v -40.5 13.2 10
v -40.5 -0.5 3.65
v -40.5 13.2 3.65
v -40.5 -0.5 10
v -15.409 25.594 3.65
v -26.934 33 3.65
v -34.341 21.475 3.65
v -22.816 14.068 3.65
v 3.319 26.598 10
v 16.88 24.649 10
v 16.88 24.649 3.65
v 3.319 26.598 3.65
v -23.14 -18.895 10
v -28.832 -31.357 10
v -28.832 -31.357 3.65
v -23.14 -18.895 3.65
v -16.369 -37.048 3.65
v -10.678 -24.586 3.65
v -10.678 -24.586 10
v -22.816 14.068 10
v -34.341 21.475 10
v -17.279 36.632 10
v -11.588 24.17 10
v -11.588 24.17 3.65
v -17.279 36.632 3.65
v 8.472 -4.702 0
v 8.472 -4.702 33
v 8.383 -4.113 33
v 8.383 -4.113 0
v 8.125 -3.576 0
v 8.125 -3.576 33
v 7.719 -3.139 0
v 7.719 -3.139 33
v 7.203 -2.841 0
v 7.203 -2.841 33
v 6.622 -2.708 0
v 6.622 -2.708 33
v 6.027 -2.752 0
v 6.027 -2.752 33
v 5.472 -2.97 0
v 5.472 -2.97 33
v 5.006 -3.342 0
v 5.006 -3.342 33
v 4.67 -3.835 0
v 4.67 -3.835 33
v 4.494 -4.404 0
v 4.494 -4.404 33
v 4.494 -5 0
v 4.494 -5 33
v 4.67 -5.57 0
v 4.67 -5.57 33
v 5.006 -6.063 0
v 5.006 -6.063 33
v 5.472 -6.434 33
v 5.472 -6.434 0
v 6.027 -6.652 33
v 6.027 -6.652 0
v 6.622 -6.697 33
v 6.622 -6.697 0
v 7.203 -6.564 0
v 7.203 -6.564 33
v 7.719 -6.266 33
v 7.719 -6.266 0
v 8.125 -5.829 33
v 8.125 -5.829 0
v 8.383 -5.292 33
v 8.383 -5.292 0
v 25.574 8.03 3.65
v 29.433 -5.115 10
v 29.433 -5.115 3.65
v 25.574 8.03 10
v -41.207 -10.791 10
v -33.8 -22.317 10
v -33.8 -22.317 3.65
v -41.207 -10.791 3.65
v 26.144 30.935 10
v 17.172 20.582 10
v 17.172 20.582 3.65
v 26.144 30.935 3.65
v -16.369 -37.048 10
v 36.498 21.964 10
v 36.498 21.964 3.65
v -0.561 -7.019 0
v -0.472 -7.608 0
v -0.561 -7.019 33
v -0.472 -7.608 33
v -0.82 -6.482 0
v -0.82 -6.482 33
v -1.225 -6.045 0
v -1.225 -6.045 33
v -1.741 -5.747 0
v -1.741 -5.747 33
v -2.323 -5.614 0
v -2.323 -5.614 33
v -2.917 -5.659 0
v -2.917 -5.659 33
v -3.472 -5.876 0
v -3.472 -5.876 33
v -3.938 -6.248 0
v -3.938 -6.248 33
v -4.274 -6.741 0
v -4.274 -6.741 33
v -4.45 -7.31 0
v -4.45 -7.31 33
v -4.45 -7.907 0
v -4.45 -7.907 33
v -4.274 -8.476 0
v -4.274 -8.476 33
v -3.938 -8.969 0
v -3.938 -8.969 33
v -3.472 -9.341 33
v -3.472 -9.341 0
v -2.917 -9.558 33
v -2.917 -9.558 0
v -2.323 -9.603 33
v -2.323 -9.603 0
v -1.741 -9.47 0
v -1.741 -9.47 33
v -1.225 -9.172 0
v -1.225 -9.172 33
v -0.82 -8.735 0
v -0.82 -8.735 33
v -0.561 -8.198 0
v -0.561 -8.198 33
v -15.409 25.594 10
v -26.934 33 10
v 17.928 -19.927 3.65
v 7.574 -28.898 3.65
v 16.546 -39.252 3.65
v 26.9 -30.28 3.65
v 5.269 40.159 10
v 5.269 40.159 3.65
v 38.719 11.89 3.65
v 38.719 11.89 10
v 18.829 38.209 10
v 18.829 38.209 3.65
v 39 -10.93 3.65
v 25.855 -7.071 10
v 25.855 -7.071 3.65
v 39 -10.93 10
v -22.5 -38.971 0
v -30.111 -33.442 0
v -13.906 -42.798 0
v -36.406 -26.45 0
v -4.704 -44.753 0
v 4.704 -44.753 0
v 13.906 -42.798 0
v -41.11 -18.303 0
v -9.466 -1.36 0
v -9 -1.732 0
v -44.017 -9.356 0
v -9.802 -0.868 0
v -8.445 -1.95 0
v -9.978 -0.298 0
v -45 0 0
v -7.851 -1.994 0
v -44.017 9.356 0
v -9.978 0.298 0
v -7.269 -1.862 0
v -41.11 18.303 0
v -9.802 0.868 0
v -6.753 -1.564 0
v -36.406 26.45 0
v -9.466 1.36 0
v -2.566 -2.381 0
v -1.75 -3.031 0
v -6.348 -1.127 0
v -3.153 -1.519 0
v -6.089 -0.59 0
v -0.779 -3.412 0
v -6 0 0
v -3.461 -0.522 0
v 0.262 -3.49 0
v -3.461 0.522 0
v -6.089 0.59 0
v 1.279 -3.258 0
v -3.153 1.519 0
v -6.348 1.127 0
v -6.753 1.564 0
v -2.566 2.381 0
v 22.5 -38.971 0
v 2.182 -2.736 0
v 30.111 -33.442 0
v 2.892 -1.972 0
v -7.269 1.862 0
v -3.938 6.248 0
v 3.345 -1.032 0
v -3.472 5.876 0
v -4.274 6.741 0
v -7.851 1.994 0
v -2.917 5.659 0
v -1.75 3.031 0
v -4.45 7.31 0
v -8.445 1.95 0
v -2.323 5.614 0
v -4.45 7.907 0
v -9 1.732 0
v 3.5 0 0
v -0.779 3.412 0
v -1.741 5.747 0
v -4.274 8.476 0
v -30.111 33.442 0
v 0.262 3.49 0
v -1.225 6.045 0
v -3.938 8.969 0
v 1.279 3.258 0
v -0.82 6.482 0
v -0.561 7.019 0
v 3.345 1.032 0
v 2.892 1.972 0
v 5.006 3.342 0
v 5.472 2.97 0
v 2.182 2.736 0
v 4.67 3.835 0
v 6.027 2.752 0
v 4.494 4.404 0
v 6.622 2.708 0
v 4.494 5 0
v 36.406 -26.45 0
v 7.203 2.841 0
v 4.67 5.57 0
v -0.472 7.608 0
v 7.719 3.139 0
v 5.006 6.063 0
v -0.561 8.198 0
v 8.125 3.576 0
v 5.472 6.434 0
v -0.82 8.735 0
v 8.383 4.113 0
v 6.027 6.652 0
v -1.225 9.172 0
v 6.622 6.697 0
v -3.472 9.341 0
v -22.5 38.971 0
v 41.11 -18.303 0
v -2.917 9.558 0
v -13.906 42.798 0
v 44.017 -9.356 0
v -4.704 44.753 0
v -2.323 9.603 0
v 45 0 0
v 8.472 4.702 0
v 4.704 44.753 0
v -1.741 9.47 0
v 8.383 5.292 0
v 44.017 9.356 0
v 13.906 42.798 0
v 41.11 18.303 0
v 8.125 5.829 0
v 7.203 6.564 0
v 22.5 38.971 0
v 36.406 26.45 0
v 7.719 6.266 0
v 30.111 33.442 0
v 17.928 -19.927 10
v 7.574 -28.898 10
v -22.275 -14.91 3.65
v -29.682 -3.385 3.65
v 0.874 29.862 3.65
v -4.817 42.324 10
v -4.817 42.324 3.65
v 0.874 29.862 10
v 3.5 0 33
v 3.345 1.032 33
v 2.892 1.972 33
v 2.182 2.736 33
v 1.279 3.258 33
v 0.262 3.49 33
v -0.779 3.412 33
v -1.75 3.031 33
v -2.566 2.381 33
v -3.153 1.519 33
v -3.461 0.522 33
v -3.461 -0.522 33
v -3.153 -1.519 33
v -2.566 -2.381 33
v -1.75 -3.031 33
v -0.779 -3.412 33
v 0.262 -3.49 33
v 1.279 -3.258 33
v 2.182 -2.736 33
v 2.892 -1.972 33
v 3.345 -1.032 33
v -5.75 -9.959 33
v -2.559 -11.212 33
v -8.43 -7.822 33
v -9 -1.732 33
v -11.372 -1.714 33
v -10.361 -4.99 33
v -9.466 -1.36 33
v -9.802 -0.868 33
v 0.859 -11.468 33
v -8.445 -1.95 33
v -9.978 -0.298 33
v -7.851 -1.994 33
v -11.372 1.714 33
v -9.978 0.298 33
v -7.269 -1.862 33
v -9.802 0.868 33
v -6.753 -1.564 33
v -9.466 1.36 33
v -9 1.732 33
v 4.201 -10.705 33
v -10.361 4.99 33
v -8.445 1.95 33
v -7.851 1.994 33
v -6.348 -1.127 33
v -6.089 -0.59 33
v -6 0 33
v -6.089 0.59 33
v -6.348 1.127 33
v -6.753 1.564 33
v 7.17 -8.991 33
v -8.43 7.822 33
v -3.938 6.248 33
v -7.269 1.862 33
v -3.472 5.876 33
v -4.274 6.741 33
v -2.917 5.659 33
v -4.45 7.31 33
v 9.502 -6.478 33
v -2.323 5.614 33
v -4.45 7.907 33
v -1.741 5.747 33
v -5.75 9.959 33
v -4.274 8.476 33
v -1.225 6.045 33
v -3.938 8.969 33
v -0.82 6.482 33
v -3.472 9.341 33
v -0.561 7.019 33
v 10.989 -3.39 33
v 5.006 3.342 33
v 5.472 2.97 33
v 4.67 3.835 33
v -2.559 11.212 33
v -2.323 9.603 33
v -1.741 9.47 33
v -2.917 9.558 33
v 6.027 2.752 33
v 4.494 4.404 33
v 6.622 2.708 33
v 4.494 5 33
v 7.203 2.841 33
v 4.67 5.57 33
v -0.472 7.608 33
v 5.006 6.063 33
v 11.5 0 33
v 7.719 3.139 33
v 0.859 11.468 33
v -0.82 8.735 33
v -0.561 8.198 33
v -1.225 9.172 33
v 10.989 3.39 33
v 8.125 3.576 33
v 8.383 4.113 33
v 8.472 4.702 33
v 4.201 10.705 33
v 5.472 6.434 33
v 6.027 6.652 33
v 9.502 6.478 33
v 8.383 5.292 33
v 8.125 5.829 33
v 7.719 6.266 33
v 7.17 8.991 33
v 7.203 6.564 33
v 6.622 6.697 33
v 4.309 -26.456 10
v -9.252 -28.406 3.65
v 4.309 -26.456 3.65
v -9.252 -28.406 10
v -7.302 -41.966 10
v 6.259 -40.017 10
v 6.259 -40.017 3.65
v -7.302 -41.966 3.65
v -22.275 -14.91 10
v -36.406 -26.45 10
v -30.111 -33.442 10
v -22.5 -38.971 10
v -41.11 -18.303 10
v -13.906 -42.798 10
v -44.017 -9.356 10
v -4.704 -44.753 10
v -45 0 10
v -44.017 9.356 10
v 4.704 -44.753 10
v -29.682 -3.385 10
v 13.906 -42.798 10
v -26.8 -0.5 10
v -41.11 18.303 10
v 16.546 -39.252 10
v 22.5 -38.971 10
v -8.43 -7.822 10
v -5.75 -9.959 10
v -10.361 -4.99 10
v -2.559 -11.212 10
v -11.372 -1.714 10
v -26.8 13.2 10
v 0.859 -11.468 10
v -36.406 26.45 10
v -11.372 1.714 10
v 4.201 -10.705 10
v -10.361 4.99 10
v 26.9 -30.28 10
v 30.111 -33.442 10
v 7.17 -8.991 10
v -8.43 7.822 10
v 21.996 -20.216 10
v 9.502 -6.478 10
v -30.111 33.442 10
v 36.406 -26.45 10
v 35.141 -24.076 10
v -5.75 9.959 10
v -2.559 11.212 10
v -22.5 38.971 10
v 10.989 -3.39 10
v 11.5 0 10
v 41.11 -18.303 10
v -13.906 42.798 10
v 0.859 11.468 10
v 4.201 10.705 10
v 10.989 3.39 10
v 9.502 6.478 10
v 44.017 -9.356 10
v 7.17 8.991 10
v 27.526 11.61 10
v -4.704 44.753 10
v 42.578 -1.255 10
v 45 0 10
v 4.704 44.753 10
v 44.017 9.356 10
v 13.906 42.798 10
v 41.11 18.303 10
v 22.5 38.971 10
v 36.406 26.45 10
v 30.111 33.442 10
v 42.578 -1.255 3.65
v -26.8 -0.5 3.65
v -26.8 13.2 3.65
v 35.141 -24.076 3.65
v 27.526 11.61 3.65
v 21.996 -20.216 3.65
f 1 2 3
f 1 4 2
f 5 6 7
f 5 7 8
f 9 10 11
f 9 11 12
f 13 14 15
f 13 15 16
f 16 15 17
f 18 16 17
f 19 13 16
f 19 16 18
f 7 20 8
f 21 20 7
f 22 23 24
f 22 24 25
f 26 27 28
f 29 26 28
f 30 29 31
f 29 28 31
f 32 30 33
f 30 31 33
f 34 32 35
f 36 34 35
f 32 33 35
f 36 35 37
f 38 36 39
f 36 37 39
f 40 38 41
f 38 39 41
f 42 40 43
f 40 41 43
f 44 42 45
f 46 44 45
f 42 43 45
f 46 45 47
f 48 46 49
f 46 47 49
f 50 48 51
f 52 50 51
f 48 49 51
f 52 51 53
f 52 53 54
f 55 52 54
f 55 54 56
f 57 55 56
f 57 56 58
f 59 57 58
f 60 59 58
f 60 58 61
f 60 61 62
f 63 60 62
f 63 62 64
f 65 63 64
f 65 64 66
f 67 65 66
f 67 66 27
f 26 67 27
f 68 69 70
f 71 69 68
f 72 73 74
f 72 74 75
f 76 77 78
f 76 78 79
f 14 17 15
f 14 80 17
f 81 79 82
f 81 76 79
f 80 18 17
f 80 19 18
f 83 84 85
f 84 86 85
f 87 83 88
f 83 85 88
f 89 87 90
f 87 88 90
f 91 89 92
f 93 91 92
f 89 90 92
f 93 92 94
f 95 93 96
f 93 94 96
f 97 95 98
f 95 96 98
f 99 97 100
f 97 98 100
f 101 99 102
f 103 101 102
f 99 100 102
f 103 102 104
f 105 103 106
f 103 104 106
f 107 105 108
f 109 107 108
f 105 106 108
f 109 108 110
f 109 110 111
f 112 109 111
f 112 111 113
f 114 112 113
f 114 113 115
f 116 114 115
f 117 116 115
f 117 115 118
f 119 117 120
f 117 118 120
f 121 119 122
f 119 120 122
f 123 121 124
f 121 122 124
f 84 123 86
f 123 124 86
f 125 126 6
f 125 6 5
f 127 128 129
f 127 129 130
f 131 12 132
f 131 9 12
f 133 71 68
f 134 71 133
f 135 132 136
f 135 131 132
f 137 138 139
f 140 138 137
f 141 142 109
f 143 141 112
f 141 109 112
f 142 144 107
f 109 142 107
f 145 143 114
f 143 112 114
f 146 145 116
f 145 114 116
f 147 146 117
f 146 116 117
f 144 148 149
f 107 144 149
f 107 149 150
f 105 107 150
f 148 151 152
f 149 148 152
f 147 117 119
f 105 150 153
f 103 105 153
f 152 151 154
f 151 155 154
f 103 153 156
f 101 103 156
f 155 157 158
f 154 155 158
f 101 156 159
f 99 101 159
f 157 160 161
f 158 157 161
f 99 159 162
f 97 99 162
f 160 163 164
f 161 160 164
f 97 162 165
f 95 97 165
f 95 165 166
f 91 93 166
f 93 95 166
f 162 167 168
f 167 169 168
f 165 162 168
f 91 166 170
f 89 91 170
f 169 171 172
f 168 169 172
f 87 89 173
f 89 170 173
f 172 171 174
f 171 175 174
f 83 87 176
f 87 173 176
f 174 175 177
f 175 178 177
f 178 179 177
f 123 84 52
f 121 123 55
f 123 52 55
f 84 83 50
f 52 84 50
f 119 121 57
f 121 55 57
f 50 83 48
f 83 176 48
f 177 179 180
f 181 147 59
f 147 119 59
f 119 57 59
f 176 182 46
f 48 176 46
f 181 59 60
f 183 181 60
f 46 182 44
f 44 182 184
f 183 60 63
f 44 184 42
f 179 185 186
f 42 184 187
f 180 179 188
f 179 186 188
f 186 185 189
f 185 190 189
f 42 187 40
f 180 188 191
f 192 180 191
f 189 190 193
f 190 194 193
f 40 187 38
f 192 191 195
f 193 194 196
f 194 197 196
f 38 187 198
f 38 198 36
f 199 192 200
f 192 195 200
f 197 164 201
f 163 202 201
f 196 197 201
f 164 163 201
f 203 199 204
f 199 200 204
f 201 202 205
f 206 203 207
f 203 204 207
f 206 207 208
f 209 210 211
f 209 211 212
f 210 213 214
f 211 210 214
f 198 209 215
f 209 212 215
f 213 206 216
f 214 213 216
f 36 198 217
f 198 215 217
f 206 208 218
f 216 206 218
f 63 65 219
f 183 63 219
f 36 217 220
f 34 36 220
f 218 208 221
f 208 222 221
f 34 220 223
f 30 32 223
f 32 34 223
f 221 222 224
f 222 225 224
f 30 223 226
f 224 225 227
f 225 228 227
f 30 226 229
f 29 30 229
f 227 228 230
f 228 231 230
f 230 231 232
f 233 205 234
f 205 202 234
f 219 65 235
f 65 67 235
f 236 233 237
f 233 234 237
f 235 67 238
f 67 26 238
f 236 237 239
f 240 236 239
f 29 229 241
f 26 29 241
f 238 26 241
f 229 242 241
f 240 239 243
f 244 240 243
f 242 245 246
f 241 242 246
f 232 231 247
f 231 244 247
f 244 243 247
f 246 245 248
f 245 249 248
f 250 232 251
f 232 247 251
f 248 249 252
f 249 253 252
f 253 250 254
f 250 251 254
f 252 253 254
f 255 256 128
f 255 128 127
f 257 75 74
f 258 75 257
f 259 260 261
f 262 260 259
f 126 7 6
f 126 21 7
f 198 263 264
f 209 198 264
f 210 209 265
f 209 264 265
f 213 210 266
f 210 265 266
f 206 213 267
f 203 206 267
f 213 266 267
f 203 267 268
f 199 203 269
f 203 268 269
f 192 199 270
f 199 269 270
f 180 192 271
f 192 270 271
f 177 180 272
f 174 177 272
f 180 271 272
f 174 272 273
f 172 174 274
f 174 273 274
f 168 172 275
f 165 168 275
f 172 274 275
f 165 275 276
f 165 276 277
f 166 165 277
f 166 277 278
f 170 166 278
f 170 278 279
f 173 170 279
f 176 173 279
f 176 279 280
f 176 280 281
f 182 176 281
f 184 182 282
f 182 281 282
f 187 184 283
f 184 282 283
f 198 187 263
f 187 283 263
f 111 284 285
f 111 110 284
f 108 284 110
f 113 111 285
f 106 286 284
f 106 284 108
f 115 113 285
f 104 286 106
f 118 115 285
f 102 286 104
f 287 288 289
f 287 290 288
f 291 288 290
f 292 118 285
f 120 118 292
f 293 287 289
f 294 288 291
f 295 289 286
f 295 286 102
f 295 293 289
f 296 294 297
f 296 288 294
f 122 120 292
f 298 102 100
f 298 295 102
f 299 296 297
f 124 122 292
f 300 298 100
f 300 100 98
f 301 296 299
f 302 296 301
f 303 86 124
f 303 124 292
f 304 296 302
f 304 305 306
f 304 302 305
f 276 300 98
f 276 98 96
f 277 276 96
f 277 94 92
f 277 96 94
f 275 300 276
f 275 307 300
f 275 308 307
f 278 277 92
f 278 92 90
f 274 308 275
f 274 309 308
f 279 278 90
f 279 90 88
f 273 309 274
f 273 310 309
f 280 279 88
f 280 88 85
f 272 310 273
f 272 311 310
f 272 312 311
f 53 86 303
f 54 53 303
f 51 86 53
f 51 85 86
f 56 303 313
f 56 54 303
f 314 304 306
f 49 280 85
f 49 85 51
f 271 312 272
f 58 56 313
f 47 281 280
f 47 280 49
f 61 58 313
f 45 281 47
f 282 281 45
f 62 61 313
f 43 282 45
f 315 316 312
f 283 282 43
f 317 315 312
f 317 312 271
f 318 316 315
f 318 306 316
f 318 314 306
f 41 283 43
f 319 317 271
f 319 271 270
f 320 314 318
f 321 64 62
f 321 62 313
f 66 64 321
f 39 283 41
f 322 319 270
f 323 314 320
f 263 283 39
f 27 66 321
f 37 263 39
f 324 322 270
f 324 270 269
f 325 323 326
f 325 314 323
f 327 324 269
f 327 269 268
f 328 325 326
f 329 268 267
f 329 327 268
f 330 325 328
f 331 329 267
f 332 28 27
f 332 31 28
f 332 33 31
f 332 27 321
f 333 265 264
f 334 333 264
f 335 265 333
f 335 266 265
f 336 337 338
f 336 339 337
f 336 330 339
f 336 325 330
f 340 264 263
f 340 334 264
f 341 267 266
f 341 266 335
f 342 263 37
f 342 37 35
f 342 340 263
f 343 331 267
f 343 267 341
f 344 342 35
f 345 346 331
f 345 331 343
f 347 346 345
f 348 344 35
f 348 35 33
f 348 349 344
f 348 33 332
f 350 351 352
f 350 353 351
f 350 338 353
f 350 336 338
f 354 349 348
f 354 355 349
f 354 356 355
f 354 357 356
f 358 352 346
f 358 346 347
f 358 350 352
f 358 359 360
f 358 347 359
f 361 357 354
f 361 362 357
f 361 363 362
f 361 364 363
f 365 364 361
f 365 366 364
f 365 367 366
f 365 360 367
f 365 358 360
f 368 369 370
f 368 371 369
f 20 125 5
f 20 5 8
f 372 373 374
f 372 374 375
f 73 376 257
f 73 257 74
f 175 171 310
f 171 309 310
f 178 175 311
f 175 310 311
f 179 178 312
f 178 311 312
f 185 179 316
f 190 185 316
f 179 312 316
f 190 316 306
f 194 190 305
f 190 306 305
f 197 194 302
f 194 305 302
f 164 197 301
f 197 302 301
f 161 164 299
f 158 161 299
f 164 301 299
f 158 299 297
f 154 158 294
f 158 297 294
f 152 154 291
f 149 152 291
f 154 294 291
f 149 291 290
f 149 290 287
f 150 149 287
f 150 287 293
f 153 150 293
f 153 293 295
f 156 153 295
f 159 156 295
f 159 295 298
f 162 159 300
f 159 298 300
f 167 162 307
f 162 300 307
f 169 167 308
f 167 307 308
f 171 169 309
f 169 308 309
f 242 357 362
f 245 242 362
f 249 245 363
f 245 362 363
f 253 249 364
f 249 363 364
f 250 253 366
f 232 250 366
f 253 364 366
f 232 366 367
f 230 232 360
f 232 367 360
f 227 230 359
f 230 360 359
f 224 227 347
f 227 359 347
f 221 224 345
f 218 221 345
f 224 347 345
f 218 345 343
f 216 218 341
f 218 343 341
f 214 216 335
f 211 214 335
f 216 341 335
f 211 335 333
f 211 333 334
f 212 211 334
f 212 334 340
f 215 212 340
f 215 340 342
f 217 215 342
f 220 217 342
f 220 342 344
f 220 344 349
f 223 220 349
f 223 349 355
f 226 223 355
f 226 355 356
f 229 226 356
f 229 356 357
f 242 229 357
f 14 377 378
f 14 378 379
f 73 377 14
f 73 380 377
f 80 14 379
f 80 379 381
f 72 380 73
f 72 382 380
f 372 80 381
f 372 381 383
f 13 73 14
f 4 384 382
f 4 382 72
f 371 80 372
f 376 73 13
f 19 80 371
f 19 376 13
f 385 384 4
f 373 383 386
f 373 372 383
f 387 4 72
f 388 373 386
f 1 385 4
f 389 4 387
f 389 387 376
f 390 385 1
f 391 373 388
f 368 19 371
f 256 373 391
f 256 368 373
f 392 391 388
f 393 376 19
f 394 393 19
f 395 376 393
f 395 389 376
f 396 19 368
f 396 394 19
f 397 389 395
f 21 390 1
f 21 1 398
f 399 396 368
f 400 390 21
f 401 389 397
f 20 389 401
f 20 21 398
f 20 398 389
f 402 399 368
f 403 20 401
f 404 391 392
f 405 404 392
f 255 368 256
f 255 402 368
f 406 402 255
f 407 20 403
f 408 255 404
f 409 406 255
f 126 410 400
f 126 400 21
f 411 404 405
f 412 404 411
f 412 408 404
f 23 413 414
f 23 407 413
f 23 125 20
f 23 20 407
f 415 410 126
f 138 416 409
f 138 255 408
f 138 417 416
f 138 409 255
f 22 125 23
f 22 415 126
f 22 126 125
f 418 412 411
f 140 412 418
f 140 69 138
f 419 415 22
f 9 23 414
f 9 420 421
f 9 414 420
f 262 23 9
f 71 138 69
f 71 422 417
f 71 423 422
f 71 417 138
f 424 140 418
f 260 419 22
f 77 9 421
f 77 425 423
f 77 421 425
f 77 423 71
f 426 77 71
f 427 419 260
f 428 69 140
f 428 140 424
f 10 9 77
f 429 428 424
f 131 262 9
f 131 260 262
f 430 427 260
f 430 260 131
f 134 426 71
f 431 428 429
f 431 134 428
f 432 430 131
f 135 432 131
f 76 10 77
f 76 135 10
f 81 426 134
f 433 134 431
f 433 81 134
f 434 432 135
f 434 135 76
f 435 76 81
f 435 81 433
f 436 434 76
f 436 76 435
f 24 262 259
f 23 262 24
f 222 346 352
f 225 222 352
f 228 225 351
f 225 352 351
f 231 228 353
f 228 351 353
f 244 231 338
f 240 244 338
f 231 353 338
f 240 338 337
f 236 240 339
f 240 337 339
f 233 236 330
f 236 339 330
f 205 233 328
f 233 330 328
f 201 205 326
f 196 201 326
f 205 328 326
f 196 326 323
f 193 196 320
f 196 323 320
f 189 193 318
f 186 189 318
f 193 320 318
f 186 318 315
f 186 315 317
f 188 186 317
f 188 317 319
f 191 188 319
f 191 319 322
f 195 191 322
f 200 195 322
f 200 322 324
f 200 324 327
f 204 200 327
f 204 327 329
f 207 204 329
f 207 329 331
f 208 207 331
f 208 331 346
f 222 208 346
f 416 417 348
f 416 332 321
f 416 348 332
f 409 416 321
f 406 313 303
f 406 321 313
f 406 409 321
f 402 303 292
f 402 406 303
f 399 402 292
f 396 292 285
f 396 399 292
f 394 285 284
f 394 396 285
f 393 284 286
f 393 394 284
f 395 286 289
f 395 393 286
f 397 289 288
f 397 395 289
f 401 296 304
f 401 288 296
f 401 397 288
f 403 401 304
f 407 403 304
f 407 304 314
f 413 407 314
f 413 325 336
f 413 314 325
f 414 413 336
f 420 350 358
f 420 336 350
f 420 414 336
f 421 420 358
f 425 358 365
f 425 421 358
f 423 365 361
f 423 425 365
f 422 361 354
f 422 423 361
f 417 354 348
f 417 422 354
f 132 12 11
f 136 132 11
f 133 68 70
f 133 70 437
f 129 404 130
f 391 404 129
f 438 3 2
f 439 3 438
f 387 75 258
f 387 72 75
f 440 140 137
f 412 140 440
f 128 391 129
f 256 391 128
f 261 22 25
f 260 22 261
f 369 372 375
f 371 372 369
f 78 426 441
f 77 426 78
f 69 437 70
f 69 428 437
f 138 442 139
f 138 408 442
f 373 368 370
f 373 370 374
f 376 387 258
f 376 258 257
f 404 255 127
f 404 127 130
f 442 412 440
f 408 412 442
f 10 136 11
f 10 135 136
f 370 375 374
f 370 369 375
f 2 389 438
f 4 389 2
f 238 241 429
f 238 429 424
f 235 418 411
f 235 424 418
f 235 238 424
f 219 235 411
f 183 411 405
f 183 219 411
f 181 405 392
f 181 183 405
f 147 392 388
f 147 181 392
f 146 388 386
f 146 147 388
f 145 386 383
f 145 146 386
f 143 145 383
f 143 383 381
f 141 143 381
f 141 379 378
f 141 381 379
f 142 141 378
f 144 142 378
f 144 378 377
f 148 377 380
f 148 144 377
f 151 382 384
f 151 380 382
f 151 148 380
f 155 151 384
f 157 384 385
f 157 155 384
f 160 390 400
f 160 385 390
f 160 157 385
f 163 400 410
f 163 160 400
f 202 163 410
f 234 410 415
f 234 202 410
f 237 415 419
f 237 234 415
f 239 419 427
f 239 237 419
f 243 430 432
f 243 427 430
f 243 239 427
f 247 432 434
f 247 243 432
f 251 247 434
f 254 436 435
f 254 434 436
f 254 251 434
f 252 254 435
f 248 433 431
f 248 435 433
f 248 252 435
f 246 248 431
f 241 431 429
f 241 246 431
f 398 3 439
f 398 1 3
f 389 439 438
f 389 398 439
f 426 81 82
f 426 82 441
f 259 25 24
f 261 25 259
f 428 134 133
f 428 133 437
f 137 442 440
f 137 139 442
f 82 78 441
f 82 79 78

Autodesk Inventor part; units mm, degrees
ref_plane "YZ Plane" through (0, 0, 0) normal (1, 0, 0) x (0, 1, 0)
ref_plane "XZ Plane" through (0, 0, 0) normal (0, 1, 0) x (-1, 0, 0)
ref_plane "XY Plane" through (0, 0, 0) normal (0, 0, 1) x (1, 0, 0)
sketch "Sketch2" plane through (0, 0, 0) normal (0, 0, 1) x (1, 0, 0)
  circle A0 centre (0, 0) radius 45
  dimension "d0" = 90
extrude "Extrusion1" add sketch "Sketch2" along normal blind 10
sketch "Sketch4" plane through (0, 0, 10) normal (0, 0, 1) x (1, 0, 0)
  circle A0 centre (0, 0) radius 11.5
  dimension "d14" = 23
extrude "Extrusion3" add sketch "Sketch4" along normal blind 23
sketch "Sketch5" plane through (0, 0, 33) normal (0, 0, 1) x (1, 0, 0)
  circle A0 centre (-8, 0) radius 2
  circle A1 centre (0, 0) radius 3.5
  circle A2 centre (0, 0) radius 11.5 construction
  circle A3 centre (-2.4721, -7.6085) radius 2
  circle A4 centre (6.4721, -4.7023) radius 2
  circle A5 centre (6.4721, 4.7023) radius 2
  circle A6 centre (-2.4721, 7.6085) radius 2
  dimension "d19" = 4
  dimension "d20" = 8
  dimension "d21" = 360
  dimension "d22" = 7
extrude "Extrusion4" cut sketch "Sketch5" against normal through all
sketch "Sketch6" plane through (0, 0, 10) normal (0, 0, 1) x (1, 0, 0)
  line L0 (-40, 0) -> (-27.3, 0)
  line L1 (-27.3, 0) -> (-27.3, 12.7)
  line L2 (-27.3, 12.7) -> (-40, 12.7)
  line L3 (-40, 12.7) -> (-40, 0)
  line L4 (-40.5, 13.2) -> (-26.8, 13.2)
  line L5 (-26.8, 13.2) -> (-26.8, -0.5)
  line L6 (-26.8, -0.5) -> (-40.5, -0.5)
  line L7 (-40.5, -0.5) -> (-40.5, 13.2)
  line L8 (-33.6501, -21.6256) -> (-22.9662, -14.7595)
  line L9 (-22.9662, -14.7595) -> (-29.8324, -4.0756)
  line L10 (-29.8324, -4.0756) -> (-40.5163, -10.9417)
  line L11 (-40.5163, -10.9417) -> (-33.6501, -21.6256)
  line L12 (-41.2072, -10.7914) -> (-29.6821, -3.3846)
  line L13 (-29.6821, -3.3846) -> (-22.2753, -14.9098)
  line L14 (-22.2753, -14.9098) -> (-33.8004, -22.3166)
  line L15 (-33.8004, -22.3166) -> (-41.2072, -10.7914)
  line L16 (-16.6166, -36.3853) -> (-11.3408, -24.833)
  line L17 (-11.3408, -24.833) -> (-22.8932, -19.5572)
  line L18 (-22.8932, -19.5572) -> (-28.1689, -31.1095)
  line L19 (-28.1689, -31.1095) -> (-16.6166, -36.3853)
  line L20 (-28.8315, -31.3566) -> (-23.1403, -18.8947)
  line L21 (-23.1403, -18.8947) -> (-10.6783, -24.5858)
  line L22 (-10.6783, -24.5858) -> (-16.3695, -37.0478)
  line L23 (-16.3695, -37.0478) -> (-28.8315, -31.3566)
  line L24 (5.6926, -39.5929) -> (3.8852, -27.0221)
  line L25 (3.8852, -27.0221) -> (-8.6855, -28.8295)
  line L26 (-8.6855, -28.8295) -> (-6.8781, -41.4003)
  line L27 (-6.8781, -41.4003) -> (5.6926, -39.5929)
  line L28 (-7.3019, -41.9663) -> (-9.2516, -28.4058)
  line L29 (-9.2516, -28.4058) -> (4.3089, -26.4561)
  line L30 (4.3089, -26.4561) -> (6.2587, -40.0166)
  line L31 (6.2587, -40.0166) -> (-7.3019, -41.9663)
  line L32 (26.1944, -30.23) -> (17.8777, -20.632)
  line L33 (17.8777, -20.632) -> (8.2797, -28.9487)
  line L34 (8.2797, -28.9487) -> (16.5964, -38.5467)
  line L35 (16.5964, -38.5467) -> (26.1944, -30.23)
  line L36 (16.546, -39.252) -> (7.5744, -28.8983)
  line L37 (7.5744, -28.8983) -> (17.9281, -19.9267)
  line L38 (17.9281, -19.9267) -> (26.8997, -30.2804)
  line L39 (26.8997, -30.2804) -> (16.546, -39.252)
  line L40 (38.3797, -11.2693) -> (26.1942, -7.6913)
  line L41 (26.1942, -7.6913) -> (22.6162, -19.8769)
  line L42 (22.6162, -19.8769) -> (34.8017, -23.4549)
  line L43 (34.8017, -23.4549) -> (38.3797, -11.2693)
  line L44 (35.1406, -24.0755) -> (21.9955, -20.2157)
  line L45 (21.9955, -20.2157) -> (25.8553, -7.0707)
  line L46 (25.8553, -7.0707) -> (39.0003, -10.9304)
  line L47 (39.0003, -10.9304) -> (35.1406, -24.0755)
  line L48 (38.3797, 11.2693) -> (26.1942, 7.6913)
  line L49 (26.1942, 7.6913) -> (29.7722, -4.4943)
  line L50 (29.7722, -4.4943) -> (41.9577, -0.9163)
  line L51 (41.9577, -0.9163) -> (38.3797, 11.2693)
  line L52 (42.5783, -1.2551) -> (29.4333, -5.1149)
  line L53 (29.4333, -5.1149) -> (25.5735, 8.0302)
  line L54 (25.5735, 8.0302) -> (38.7186, 11.8899)
  line L55 (38.7186, 11.8899) -> (42.5783, -1.2551)
  line L56 (26.1944, 30.23) -> (17.8777, 20.632)
  line L57 (17.8777, 20.632) -> (27.4757, 12.3152)
  line L58 (27.4757, 12.3152) -> (35.7924, 21.9133)
  line L59 (35.7924, 21.9133) -> (26.1944, 30.23)
  line L60 (36.4978, 21.9637) -> (27.5262, 11.6099)
  line L61 (27.5262, 11.6099) -> (17.1724, 20.5815)
  line L62 (17.1724, 20.5815) -> (26.144, 30.9353)
  line L63 (26.144, 30.9353) -> (36.4978, 21.9637)
  line L64 (5.6926, 39.5929) -> (3.8852, 27.0221)
  line L65 (3.8852, 27.0221) -> (16.4559, 25.2147)
  line L66 (16.4559, 25.2147) -> (18.2633, 37.7855)
  line L67 (18.2633, 37.7855) -> (5.6926, 39.5929)
  line L68 (18.8294, 38.2092) -> (16.8797, 24.6487)
  line L69 (16.8797, 24.6487) -> (3.3191, 26.5984)
  line L70 (3.3191, 26.5984) -> (5.2688, 40.1589)
  line L71 (5.2688, 40.1589) -> (18.8294, 38.2092)
  line L72 (-16.6166, 36.3853) -> (-11.3408, 24.833)
  line L73 (-11.3408, 24.833) -> (0.2115, 30.1087)
  line L74 (0.2115, 30.1087) -> (-5.0643, 41.6611)
  line L75 (-5.0643, 41.6611) -> (-16.6166, 36.3853)
  line L76 (-4.8172, 42.3236) -> (0.874, 29.8616)
  line L77 (0.874, 29.8616) -> (-11.5879, 24.1704)
  line L78 (-11.5879, 24.1704) -> (-17.2791, 36.6324)
  line L79 (-17.2791, 36.6324) -> (-4.8172, 42.3236)
  line L80 (-33.6501, 21.6256) -> (-22.9662, 14.7595)
  line L81 (-22.9662, 14.7595) -> (-16.1001, 25.4434)
  line L82 (-16.1001, 25.4434) -> (-26.784, 32.3096)
  line L83 (-26.784, 32.3096) -> (-33.6501, 21.6256)
  line L84 (-26.9343, 33.0005) -> (-15.4091, 25.5937)
  line L85 (-15.4091, 25.5937) -> (-22.8159, 14.0685)
  line L86 (-22.8159, 14.0685) -> (-34.3411, 21.4753)
  line L87 (-34.3411, 21.4753) -> (-26.9343, 33.0005)
  point P0 (0, 0)
  dimension "d25" = 12.7
  dimension "d26" = 12.7
  dimension "d27" = 40
  dimension "d28" = 0.5
  dimension "d31" = 360
extrude "Extrusion5" cut sketch "Sketch6" against normal blind 6.35 contours L3 L2 L1 L0 | L4 L5 L6 L7 | L11 L10 L9 L8 | L12 L13 L14 L15 | L19 L18 L17 L16 | L20 L21 L22 L23 | L27 L26 L25 L24 | L28 L29 L30 L31 | L35 L34 L33 L32 | L36 L37 L38 L39 | L43 L42 L41 L40 | L44 L45 L46 L47 | L51 L50 L49 L48 | L52 L53 L54 L55 | L59 L58 L57 L56 | L60 L61 L62 L63 | L67 L66 L65 L64 | L68 L69 L70 L71 | L75 L74 L73 L72 | L76 L77 L78 L79 | L83 L82 L81 L80 | L84 L85 L86 L87
properties part number "SG02" material "ABS Plastic"
